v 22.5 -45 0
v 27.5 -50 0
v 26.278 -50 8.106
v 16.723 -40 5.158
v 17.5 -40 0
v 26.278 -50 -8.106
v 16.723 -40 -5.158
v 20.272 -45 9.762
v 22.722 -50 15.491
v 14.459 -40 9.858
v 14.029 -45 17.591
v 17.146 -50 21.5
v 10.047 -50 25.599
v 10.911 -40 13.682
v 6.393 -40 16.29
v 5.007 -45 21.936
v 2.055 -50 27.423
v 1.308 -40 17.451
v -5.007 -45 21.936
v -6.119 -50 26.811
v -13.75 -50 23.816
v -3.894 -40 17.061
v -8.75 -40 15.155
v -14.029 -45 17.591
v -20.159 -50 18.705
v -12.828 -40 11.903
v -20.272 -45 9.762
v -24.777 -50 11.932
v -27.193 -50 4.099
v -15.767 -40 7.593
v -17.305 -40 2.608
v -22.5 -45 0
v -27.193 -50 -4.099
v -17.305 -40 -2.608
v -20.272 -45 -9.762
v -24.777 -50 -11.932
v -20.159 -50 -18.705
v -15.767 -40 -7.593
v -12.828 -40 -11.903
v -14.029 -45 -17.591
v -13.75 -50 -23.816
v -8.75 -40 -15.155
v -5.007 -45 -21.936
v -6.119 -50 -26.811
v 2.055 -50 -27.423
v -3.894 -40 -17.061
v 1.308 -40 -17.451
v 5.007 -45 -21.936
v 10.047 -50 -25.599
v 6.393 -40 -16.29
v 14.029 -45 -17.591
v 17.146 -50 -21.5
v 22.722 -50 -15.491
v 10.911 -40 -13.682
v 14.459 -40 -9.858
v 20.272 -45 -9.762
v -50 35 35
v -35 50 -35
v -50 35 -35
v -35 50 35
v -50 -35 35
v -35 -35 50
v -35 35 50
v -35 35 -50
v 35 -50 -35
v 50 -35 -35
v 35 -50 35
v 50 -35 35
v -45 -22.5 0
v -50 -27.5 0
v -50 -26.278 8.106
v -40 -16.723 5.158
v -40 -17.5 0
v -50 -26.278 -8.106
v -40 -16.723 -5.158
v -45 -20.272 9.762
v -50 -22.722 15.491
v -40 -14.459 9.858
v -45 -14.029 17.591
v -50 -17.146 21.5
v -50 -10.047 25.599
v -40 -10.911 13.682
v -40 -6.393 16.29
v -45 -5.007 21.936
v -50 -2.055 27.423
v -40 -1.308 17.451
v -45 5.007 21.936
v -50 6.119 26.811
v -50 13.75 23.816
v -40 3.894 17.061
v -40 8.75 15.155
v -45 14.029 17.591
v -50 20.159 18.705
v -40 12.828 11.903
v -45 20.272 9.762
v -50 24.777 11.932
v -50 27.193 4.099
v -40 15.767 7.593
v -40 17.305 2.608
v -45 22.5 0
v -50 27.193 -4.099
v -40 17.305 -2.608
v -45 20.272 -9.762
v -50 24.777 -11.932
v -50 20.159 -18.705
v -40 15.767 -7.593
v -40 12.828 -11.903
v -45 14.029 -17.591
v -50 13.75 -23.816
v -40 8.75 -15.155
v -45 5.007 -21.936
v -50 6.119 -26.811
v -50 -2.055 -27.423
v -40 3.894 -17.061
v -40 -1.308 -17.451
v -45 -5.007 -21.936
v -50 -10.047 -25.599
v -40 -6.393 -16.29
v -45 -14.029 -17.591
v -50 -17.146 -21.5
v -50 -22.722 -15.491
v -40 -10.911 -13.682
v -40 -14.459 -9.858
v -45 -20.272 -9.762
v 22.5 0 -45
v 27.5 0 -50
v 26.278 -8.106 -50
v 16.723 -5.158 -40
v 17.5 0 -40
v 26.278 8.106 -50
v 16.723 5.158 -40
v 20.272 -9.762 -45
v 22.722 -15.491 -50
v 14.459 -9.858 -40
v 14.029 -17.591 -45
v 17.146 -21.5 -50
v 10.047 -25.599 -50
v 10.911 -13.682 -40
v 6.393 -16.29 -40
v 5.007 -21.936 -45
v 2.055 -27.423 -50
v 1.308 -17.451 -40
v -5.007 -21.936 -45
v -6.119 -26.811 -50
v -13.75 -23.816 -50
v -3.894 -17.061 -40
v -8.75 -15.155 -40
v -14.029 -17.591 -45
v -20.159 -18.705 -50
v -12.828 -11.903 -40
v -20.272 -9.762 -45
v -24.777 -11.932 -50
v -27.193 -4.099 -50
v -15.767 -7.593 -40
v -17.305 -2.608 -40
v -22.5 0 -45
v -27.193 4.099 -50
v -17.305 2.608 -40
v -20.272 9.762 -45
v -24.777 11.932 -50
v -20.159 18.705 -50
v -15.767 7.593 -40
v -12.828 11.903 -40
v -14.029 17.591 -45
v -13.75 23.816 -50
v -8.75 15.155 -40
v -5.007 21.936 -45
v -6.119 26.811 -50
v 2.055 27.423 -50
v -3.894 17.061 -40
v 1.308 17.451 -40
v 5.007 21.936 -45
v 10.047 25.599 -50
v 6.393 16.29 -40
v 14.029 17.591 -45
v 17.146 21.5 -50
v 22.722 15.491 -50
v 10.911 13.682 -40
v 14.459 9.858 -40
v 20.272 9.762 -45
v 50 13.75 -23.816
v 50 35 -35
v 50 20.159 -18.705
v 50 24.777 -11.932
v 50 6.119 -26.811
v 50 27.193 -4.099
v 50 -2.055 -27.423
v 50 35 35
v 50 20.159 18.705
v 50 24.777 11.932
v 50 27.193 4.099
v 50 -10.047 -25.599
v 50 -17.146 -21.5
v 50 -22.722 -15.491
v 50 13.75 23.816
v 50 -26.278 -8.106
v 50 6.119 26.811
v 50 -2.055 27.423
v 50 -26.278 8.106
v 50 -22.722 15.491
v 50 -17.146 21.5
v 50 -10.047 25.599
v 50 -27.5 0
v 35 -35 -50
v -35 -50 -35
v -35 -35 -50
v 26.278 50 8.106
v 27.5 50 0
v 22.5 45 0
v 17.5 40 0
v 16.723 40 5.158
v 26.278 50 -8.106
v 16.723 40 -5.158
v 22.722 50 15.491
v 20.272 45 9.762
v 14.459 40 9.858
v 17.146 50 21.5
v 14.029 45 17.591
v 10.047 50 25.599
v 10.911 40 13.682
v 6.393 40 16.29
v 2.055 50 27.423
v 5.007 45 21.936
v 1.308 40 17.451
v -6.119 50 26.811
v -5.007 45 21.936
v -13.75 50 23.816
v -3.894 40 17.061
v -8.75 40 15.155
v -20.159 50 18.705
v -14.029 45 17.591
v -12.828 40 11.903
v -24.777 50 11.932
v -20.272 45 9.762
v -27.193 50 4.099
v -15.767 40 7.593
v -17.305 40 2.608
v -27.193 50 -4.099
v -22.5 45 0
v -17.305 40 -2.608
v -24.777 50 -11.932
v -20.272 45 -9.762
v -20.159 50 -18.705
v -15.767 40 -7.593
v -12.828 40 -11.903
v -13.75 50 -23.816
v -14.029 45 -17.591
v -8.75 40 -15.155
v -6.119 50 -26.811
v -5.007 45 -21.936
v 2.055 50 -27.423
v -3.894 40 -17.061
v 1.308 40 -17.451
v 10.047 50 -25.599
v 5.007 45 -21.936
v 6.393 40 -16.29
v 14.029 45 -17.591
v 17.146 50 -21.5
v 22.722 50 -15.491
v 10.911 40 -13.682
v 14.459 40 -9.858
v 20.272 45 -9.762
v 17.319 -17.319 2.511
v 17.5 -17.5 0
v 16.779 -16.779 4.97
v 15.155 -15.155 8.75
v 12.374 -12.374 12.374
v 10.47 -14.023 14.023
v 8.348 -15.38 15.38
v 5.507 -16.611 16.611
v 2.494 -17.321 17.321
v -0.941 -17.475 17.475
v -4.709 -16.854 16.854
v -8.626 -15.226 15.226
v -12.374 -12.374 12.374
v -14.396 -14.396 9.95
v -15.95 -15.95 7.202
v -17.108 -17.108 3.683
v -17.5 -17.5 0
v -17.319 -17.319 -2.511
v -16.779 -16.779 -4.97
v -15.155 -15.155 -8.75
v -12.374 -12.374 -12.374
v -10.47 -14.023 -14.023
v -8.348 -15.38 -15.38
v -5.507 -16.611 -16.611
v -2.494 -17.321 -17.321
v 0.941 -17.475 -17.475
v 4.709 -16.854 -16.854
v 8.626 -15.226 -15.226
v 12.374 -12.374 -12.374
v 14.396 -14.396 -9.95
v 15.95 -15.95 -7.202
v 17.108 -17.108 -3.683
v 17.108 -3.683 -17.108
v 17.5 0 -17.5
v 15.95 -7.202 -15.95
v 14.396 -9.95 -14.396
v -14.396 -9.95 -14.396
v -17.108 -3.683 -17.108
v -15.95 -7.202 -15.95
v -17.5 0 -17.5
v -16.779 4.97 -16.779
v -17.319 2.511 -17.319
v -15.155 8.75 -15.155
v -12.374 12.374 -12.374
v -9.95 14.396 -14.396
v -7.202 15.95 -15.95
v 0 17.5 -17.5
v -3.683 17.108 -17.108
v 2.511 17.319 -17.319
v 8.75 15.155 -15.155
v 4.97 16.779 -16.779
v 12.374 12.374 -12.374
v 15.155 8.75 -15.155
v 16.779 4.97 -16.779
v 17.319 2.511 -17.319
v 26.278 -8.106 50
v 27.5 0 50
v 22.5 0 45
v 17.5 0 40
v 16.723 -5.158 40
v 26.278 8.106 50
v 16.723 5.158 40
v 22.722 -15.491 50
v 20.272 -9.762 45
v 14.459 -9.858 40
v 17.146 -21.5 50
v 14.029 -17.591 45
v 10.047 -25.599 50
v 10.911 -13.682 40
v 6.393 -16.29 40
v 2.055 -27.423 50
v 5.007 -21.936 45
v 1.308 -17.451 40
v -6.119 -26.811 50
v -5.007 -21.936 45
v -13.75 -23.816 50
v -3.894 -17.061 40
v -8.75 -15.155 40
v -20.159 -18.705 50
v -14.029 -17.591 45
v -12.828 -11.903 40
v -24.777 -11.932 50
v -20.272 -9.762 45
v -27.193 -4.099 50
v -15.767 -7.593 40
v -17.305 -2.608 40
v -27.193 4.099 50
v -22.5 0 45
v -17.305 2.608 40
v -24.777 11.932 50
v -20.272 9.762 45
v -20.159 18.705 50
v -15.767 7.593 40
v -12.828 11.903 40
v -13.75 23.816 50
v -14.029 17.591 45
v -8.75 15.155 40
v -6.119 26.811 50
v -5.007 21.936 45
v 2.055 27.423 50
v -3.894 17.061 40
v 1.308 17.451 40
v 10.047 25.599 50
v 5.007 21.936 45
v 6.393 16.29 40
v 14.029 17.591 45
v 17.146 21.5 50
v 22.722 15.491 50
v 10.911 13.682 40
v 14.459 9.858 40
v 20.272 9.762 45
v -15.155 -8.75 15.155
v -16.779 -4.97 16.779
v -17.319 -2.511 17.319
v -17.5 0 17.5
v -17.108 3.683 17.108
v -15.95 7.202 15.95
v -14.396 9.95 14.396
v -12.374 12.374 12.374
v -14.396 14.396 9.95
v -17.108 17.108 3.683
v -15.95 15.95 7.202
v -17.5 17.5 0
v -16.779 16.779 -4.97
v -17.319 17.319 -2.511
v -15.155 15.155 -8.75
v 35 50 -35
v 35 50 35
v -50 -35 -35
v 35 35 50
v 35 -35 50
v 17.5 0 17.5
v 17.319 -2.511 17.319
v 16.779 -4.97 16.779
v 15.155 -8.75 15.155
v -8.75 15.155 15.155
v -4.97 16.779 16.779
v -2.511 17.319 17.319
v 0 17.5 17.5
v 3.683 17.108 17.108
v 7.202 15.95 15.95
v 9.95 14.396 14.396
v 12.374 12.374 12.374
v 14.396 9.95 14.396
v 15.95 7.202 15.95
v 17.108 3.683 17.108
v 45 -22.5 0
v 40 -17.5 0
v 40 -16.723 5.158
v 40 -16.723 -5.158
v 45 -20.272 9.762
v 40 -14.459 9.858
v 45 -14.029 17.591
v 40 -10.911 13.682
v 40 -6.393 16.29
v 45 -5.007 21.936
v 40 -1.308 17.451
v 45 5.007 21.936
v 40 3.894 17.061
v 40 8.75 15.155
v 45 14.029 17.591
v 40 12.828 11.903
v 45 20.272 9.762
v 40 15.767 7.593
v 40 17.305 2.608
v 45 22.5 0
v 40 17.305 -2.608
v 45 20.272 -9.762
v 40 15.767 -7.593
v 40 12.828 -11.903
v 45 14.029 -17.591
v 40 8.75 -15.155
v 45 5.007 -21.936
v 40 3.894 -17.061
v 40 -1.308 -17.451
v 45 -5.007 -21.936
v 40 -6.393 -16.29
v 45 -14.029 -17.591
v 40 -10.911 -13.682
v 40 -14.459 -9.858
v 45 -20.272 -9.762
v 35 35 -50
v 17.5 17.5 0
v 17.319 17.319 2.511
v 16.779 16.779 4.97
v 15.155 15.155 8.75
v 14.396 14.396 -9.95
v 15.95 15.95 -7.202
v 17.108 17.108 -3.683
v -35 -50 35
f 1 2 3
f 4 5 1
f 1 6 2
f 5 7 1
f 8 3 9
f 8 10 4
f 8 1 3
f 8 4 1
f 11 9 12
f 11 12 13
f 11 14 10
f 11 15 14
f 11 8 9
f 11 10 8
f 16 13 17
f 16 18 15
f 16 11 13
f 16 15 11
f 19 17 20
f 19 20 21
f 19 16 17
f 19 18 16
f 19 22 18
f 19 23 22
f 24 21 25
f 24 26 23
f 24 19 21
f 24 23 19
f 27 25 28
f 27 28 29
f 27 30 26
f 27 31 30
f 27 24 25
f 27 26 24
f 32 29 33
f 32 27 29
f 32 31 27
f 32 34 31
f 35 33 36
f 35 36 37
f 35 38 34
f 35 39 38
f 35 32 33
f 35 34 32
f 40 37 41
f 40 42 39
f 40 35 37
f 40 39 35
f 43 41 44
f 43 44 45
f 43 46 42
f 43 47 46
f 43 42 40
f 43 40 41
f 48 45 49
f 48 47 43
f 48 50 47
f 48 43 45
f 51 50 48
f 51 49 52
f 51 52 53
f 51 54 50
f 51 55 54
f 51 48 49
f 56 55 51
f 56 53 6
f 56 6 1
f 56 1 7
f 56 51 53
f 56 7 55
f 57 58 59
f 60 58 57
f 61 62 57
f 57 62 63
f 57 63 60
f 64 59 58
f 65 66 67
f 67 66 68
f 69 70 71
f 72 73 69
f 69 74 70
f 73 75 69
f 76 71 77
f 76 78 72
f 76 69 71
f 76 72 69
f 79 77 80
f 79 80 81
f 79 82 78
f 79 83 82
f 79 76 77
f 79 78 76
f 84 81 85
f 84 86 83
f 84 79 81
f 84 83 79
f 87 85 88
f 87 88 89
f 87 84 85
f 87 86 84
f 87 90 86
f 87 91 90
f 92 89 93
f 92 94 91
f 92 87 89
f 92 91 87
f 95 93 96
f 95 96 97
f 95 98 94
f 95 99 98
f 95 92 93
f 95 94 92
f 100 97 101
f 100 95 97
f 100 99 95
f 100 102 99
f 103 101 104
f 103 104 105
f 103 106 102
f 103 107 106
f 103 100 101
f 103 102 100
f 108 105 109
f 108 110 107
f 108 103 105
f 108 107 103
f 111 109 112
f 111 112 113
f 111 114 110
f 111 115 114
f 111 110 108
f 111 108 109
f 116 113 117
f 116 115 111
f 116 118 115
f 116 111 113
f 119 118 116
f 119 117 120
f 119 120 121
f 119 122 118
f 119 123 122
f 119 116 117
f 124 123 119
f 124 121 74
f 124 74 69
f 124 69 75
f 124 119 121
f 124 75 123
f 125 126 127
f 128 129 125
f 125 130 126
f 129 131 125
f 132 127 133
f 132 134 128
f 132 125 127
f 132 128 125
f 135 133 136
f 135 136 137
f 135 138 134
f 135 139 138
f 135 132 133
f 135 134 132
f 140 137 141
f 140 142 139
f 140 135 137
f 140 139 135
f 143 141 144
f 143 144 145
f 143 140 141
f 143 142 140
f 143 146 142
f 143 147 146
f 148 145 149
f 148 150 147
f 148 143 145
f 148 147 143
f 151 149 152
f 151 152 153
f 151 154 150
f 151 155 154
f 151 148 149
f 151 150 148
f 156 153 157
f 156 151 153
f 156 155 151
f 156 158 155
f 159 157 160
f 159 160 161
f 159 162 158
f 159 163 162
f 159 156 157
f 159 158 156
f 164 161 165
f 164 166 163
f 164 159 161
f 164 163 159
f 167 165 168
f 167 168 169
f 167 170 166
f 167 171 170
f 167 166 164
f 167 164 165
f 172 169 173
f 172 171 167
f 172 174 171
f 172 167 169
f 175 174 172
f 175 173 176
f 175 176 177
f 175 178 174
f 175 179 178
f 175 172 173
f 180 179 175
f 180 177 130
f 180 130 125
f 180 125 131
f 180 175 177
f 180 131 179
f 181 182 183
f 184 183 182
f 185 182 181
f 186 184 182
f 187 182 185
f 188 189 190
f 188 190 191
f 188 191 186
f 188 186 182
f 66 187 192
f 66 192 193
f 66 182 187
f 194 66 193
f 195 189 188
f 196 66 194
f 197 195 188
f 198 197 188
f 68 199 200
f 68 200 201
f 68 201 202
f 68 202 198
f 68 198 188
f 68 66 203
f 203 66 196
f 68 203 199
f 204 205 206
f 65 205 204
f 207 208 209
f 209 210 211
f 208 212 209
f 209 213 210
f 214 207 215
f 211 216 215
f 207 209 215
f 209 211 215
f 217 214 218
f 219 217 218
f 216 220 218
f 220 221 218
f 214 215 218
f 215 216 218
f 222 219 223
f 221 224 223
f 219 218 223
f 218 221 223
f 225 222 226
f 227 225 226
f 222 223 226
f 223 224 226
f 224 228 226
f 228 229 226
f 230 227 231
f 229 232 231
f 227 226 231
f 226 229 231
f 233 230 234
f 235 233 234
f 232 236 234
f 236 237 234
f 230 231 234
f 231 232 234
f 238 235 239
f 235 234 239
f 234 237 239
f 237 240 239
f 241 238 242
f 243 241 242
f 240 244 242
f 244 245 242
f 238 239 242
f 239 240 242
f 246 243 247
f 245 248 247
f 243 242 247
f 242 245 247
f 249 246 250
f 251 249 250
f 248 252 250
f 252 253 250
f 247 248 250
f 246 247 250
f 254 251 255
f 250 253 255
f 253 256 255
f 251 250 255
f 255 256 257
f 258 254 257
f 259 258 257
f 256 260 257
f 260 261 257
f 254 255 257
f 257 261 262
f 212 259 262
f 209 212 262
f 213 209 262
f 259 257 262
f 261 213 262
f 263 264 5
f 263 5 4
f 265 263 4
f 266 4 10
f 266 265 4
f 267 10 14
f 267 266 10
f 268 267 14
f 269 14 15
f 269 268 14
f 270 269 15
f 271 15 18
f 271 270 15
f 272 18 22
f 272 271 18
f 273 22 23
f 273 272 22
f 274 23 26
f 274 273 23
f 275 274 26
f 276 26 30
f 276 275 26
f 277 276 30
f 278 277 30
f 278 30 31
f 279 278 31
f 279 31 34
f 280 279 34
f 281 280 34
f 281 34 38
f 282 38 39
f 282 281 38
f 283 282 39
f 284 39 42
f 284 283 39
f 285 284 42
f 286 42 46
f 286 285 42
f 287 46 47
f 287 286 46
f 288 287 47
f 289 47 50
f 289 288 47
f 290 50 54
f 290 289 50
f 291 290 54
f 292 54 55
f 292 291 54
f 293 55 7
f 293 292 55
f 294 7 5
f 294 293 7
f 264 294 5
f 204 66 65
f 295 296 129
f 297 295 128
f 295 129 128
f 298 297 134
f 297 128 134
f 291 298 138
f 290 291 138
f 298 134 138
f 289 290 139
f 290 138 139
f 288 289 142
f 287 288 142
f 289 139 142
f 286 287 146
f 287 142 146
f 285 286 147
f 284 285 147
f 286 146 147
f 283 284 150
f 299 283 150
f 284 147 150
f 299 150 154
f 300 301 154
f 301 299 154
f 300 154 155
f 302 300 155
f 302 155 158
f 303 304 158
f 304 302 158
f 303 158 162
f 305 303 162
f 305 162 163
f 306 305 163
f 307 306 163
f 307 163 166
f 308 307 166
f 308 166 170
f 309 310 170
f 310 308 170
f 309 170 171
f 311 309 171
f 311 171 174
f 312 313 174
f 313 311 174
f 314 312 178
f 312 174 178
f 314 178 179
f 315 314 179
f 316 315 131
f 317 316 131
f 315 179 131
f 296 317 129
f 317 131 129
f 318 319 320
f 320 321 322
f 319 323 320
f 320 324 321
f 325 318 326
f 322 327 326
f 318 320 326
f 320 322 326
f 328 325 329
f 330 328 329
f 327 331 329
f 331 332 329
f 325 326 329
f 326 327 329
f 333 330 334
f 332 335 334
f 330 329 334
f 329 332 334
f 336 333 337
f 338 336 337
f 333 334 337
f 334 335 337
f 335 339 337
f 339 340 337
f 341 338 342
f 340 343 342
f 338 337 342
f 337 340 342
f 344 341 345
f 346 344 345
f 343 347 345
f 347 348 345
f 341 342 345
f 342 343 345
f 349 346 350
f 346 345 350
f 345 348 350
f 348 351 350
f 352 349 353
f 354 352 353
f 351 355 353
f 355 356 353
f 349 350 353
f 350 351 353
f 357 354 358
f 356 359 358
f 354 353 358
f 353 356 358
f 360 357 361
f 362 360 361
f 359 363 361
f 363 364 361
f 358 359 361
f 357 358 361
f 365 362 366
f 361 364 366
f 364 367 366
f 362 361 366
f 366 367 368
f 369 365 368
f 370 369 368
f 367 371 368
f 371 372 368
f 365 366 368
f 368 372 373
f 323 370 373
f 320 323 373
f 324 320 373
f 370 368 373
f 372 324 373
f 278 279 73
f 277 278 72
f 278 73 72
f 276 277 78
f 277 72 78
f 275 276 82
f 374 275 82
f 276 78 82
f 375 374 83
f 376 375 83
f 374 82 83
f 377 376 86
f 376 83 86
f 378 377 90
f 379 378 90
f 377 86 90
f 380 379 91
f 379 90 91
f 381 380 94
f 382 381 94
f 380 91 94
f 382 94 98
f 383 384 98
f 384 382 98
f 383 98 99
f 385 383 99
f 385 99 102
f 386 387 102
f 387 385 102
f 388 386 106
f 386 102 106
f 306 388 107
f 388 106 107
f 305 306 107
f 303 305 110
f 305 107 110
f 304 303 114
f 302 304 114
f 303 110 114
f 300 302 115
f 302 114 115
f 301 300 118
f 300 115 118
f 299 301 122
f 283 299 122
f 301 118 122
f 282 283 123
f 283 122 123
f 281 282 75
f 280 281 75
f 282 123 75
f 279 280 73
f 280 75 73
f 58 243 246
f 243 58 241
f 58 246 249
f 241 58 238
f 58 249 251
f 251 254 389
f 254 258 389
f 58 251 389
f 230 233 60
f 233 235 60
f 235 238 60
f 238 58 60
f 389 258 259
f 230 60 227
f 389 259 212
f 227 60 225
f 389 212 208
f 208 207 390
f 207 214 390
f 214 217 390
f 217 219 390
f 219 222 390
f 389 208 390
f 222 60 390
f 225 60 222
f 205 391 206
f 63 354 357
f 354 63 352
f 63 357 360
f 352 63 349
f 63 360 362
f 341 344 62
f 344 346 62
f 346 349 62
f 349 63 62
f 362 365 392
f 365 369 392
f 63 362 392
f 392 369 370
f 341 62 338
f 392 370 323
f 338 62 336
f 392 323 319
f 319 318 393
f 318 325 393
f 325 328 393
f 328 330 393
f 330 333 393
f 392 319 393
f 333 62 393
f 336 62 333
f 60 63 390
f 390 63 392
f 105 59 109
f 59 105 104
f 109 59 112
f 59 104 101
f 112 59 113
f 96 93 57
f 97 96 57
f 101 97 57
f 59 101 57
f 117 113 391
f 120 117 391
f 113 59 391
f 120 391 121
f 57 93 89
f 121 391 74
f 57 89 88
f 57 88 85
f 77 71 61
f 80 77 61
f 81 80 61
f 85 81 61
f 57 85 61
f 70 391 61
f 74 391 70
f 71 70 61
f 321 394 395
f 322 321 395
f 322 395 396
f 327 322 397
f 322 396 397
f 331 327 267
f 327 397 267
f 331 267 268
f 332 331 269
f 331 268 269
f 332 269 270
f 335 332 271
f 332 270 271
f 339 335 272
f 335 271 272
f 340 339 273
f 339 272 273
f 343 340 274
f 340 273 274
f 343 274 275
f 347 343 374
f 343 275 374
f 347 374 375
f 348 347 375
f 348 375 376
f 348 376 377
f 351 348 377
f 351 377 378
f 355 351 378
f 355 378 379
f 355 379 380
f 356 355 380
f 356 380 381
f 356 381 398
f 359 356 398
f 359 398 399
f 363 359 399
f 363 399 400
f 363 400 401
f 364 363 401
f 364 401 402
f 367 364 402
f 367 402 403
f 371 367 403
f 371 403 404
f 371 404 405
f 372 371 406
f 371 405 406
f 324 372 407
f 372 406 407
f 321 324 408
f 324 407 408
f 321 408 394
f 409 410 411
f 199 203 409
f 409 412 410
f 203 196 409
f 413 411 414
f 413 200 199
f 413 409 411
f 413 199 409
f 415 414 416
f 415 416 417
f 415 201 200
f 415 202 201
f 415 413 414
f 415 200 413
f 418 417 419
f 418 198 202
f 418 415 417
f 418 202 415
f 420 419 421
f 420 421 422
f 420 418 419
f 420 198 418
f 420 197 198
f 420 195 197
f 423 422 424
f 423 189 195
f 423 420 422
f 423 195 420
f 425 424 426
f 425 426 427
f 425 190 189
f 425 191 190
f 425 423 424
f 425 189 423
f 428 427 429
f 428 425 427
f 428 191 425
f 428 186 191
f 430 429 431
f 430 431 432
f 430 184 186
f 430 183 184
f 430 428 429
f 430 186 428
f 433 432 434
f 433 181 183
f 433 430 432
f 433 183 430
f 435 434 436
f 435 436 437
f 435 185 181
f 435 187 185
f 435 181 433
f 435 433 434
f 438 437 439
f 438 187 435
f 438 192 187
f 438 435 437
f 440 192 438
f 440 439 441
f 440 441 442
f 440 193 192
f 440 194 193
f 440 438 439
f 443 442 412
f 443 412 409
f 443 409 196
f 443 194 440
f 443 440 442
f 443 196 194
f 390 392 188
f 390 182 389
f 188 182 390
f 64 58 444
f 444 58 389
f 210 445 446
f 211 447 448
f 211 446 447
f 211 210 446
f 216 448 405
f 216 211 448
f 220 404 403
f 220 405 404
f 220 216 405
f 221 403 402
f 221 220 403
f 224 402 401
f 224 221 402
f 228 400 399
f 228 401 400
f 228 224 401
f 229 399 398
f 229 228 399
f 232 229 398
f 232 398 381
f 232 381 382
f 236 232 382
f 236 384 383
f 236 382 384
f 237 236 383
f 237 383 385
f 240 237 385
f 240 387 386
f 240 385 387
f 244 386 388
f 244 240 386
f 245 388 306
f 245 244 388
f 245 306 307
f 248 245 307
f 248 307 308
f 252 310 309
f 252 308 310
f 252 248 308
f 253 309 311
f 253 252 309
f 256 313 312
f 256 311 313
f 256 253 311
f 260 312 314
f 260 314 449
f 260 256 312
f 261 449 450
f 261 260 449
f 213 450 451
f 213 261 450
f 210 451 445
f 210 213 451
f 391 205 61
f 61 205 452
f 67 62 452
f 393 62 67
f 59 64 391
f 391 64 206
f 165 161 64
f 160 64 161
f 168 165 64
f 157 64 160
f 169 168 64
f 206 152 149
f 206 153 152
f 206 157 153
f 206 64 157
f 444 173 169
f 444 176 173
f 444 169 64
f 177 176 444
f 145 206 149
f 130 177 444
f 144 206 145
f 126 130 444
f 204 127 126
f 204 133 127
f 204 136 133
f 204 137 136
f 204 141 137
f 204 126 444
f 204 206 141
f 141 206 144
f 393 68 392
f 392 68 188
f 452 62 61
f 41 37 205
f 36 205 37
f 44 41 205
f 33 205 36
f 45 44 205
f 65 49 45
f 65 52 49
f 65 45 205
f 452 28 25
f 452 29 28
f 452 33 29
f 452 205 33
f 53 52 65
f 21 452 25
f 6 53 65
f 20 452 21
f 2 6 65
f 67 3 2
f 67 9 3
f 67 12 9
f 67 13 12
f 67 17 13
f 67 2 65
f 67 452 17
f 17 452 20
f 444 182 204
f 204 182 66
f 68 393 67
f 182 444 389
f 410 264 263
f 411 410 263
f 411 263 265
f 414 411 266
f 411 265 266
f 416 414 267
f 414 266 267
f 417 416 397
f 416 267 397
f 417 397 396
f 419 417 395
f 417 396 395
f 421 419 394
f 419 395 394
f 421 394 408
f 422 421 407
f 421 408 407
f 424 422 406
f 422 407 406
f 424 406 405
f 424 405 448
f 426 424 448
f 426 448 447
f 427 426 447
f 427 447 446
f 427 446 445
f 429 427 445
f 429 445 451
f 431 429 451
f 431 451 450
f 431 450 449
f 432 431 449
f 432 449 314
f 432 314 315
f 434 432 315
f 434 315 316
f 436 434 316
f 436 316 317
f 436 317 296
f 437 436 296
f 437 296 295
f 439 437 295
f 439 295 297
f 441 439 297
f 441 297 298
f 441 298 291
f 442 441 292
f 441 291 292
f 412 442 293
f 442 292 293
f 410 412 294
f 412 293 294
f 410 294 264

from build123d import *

# Parameters (mm, degrees)
F0_W     = 100
F0_H     = 100
F0_R     = 17.5
F1_DEPTH = 50
F2_R     = 17.5
F3_DEPTH = 100
F4_R     = 17.5
F5_DEPTH = 100
F6_SIZE  = 15
F7_SIZE  = 10


with BuildPart() as f1:
    # F0 (on Front) → F1 (new body, symmetric)
    with BuildSketch(Plane.XZ):
        Rectangle(F0_W, F0_H)
        Circle(F0_R, mode=Mode.SUBTRACT)
    extrude(amount=F1_DEPTH, both=True)

    # F2 (on face) → F3 (cut, through all)
    with BuildSketch(Plane(origin=(-50, 0, 0), x_dir=(0, -1, 0), z_dir=(-1, 0, 0))):
        Circle(F2_R)
    extrude(amount=-F3_DEPTH, mode=Mode.SUBTRACT)

    # F4 (on face) → F5 (cut, through all)
    with BuildSketch(Plane(origin=(0, 0, -50), x_dir=(1, 0, 0), z_dir=(0, 0, -1))):
        Circle(F4_R)
    extrude(amount=-F5_DEPTH, mode=Mode.SUBTRACT)

    # F6
    f6_edges = [f1.edges().sort_by_distance(p)[0] for p in [
        (0, 50, 50),
        (50, 0, 50),
        (0, -50, 50),
        (-50, 0, 50),
        (-50, 50, 0),
        (-50, -50, 0),
        (-50, 0, -50),
        (0, 50, -50),
        (50, 0, -50),
        (50, -50, 0),
        (0, -50, -50),
        (50, 50, 0),
    ]]
    chamfer(f6_edges, length=F6_SIZE)

    # F7
    f7_edges = [f1.edges().sort_by_distance(p)[0] for p in [
        (50, 17.5, 0),
        (-17.5, 50, 0),
        (-17.5, 0, -50),
        (-17.5, -50, 0),
        (-50, 17.5, 0),
        (-17.5, 0, 50),
    ]]
    chamfer(f7_edges, length=F7_SIZE)


solid = f1.part
